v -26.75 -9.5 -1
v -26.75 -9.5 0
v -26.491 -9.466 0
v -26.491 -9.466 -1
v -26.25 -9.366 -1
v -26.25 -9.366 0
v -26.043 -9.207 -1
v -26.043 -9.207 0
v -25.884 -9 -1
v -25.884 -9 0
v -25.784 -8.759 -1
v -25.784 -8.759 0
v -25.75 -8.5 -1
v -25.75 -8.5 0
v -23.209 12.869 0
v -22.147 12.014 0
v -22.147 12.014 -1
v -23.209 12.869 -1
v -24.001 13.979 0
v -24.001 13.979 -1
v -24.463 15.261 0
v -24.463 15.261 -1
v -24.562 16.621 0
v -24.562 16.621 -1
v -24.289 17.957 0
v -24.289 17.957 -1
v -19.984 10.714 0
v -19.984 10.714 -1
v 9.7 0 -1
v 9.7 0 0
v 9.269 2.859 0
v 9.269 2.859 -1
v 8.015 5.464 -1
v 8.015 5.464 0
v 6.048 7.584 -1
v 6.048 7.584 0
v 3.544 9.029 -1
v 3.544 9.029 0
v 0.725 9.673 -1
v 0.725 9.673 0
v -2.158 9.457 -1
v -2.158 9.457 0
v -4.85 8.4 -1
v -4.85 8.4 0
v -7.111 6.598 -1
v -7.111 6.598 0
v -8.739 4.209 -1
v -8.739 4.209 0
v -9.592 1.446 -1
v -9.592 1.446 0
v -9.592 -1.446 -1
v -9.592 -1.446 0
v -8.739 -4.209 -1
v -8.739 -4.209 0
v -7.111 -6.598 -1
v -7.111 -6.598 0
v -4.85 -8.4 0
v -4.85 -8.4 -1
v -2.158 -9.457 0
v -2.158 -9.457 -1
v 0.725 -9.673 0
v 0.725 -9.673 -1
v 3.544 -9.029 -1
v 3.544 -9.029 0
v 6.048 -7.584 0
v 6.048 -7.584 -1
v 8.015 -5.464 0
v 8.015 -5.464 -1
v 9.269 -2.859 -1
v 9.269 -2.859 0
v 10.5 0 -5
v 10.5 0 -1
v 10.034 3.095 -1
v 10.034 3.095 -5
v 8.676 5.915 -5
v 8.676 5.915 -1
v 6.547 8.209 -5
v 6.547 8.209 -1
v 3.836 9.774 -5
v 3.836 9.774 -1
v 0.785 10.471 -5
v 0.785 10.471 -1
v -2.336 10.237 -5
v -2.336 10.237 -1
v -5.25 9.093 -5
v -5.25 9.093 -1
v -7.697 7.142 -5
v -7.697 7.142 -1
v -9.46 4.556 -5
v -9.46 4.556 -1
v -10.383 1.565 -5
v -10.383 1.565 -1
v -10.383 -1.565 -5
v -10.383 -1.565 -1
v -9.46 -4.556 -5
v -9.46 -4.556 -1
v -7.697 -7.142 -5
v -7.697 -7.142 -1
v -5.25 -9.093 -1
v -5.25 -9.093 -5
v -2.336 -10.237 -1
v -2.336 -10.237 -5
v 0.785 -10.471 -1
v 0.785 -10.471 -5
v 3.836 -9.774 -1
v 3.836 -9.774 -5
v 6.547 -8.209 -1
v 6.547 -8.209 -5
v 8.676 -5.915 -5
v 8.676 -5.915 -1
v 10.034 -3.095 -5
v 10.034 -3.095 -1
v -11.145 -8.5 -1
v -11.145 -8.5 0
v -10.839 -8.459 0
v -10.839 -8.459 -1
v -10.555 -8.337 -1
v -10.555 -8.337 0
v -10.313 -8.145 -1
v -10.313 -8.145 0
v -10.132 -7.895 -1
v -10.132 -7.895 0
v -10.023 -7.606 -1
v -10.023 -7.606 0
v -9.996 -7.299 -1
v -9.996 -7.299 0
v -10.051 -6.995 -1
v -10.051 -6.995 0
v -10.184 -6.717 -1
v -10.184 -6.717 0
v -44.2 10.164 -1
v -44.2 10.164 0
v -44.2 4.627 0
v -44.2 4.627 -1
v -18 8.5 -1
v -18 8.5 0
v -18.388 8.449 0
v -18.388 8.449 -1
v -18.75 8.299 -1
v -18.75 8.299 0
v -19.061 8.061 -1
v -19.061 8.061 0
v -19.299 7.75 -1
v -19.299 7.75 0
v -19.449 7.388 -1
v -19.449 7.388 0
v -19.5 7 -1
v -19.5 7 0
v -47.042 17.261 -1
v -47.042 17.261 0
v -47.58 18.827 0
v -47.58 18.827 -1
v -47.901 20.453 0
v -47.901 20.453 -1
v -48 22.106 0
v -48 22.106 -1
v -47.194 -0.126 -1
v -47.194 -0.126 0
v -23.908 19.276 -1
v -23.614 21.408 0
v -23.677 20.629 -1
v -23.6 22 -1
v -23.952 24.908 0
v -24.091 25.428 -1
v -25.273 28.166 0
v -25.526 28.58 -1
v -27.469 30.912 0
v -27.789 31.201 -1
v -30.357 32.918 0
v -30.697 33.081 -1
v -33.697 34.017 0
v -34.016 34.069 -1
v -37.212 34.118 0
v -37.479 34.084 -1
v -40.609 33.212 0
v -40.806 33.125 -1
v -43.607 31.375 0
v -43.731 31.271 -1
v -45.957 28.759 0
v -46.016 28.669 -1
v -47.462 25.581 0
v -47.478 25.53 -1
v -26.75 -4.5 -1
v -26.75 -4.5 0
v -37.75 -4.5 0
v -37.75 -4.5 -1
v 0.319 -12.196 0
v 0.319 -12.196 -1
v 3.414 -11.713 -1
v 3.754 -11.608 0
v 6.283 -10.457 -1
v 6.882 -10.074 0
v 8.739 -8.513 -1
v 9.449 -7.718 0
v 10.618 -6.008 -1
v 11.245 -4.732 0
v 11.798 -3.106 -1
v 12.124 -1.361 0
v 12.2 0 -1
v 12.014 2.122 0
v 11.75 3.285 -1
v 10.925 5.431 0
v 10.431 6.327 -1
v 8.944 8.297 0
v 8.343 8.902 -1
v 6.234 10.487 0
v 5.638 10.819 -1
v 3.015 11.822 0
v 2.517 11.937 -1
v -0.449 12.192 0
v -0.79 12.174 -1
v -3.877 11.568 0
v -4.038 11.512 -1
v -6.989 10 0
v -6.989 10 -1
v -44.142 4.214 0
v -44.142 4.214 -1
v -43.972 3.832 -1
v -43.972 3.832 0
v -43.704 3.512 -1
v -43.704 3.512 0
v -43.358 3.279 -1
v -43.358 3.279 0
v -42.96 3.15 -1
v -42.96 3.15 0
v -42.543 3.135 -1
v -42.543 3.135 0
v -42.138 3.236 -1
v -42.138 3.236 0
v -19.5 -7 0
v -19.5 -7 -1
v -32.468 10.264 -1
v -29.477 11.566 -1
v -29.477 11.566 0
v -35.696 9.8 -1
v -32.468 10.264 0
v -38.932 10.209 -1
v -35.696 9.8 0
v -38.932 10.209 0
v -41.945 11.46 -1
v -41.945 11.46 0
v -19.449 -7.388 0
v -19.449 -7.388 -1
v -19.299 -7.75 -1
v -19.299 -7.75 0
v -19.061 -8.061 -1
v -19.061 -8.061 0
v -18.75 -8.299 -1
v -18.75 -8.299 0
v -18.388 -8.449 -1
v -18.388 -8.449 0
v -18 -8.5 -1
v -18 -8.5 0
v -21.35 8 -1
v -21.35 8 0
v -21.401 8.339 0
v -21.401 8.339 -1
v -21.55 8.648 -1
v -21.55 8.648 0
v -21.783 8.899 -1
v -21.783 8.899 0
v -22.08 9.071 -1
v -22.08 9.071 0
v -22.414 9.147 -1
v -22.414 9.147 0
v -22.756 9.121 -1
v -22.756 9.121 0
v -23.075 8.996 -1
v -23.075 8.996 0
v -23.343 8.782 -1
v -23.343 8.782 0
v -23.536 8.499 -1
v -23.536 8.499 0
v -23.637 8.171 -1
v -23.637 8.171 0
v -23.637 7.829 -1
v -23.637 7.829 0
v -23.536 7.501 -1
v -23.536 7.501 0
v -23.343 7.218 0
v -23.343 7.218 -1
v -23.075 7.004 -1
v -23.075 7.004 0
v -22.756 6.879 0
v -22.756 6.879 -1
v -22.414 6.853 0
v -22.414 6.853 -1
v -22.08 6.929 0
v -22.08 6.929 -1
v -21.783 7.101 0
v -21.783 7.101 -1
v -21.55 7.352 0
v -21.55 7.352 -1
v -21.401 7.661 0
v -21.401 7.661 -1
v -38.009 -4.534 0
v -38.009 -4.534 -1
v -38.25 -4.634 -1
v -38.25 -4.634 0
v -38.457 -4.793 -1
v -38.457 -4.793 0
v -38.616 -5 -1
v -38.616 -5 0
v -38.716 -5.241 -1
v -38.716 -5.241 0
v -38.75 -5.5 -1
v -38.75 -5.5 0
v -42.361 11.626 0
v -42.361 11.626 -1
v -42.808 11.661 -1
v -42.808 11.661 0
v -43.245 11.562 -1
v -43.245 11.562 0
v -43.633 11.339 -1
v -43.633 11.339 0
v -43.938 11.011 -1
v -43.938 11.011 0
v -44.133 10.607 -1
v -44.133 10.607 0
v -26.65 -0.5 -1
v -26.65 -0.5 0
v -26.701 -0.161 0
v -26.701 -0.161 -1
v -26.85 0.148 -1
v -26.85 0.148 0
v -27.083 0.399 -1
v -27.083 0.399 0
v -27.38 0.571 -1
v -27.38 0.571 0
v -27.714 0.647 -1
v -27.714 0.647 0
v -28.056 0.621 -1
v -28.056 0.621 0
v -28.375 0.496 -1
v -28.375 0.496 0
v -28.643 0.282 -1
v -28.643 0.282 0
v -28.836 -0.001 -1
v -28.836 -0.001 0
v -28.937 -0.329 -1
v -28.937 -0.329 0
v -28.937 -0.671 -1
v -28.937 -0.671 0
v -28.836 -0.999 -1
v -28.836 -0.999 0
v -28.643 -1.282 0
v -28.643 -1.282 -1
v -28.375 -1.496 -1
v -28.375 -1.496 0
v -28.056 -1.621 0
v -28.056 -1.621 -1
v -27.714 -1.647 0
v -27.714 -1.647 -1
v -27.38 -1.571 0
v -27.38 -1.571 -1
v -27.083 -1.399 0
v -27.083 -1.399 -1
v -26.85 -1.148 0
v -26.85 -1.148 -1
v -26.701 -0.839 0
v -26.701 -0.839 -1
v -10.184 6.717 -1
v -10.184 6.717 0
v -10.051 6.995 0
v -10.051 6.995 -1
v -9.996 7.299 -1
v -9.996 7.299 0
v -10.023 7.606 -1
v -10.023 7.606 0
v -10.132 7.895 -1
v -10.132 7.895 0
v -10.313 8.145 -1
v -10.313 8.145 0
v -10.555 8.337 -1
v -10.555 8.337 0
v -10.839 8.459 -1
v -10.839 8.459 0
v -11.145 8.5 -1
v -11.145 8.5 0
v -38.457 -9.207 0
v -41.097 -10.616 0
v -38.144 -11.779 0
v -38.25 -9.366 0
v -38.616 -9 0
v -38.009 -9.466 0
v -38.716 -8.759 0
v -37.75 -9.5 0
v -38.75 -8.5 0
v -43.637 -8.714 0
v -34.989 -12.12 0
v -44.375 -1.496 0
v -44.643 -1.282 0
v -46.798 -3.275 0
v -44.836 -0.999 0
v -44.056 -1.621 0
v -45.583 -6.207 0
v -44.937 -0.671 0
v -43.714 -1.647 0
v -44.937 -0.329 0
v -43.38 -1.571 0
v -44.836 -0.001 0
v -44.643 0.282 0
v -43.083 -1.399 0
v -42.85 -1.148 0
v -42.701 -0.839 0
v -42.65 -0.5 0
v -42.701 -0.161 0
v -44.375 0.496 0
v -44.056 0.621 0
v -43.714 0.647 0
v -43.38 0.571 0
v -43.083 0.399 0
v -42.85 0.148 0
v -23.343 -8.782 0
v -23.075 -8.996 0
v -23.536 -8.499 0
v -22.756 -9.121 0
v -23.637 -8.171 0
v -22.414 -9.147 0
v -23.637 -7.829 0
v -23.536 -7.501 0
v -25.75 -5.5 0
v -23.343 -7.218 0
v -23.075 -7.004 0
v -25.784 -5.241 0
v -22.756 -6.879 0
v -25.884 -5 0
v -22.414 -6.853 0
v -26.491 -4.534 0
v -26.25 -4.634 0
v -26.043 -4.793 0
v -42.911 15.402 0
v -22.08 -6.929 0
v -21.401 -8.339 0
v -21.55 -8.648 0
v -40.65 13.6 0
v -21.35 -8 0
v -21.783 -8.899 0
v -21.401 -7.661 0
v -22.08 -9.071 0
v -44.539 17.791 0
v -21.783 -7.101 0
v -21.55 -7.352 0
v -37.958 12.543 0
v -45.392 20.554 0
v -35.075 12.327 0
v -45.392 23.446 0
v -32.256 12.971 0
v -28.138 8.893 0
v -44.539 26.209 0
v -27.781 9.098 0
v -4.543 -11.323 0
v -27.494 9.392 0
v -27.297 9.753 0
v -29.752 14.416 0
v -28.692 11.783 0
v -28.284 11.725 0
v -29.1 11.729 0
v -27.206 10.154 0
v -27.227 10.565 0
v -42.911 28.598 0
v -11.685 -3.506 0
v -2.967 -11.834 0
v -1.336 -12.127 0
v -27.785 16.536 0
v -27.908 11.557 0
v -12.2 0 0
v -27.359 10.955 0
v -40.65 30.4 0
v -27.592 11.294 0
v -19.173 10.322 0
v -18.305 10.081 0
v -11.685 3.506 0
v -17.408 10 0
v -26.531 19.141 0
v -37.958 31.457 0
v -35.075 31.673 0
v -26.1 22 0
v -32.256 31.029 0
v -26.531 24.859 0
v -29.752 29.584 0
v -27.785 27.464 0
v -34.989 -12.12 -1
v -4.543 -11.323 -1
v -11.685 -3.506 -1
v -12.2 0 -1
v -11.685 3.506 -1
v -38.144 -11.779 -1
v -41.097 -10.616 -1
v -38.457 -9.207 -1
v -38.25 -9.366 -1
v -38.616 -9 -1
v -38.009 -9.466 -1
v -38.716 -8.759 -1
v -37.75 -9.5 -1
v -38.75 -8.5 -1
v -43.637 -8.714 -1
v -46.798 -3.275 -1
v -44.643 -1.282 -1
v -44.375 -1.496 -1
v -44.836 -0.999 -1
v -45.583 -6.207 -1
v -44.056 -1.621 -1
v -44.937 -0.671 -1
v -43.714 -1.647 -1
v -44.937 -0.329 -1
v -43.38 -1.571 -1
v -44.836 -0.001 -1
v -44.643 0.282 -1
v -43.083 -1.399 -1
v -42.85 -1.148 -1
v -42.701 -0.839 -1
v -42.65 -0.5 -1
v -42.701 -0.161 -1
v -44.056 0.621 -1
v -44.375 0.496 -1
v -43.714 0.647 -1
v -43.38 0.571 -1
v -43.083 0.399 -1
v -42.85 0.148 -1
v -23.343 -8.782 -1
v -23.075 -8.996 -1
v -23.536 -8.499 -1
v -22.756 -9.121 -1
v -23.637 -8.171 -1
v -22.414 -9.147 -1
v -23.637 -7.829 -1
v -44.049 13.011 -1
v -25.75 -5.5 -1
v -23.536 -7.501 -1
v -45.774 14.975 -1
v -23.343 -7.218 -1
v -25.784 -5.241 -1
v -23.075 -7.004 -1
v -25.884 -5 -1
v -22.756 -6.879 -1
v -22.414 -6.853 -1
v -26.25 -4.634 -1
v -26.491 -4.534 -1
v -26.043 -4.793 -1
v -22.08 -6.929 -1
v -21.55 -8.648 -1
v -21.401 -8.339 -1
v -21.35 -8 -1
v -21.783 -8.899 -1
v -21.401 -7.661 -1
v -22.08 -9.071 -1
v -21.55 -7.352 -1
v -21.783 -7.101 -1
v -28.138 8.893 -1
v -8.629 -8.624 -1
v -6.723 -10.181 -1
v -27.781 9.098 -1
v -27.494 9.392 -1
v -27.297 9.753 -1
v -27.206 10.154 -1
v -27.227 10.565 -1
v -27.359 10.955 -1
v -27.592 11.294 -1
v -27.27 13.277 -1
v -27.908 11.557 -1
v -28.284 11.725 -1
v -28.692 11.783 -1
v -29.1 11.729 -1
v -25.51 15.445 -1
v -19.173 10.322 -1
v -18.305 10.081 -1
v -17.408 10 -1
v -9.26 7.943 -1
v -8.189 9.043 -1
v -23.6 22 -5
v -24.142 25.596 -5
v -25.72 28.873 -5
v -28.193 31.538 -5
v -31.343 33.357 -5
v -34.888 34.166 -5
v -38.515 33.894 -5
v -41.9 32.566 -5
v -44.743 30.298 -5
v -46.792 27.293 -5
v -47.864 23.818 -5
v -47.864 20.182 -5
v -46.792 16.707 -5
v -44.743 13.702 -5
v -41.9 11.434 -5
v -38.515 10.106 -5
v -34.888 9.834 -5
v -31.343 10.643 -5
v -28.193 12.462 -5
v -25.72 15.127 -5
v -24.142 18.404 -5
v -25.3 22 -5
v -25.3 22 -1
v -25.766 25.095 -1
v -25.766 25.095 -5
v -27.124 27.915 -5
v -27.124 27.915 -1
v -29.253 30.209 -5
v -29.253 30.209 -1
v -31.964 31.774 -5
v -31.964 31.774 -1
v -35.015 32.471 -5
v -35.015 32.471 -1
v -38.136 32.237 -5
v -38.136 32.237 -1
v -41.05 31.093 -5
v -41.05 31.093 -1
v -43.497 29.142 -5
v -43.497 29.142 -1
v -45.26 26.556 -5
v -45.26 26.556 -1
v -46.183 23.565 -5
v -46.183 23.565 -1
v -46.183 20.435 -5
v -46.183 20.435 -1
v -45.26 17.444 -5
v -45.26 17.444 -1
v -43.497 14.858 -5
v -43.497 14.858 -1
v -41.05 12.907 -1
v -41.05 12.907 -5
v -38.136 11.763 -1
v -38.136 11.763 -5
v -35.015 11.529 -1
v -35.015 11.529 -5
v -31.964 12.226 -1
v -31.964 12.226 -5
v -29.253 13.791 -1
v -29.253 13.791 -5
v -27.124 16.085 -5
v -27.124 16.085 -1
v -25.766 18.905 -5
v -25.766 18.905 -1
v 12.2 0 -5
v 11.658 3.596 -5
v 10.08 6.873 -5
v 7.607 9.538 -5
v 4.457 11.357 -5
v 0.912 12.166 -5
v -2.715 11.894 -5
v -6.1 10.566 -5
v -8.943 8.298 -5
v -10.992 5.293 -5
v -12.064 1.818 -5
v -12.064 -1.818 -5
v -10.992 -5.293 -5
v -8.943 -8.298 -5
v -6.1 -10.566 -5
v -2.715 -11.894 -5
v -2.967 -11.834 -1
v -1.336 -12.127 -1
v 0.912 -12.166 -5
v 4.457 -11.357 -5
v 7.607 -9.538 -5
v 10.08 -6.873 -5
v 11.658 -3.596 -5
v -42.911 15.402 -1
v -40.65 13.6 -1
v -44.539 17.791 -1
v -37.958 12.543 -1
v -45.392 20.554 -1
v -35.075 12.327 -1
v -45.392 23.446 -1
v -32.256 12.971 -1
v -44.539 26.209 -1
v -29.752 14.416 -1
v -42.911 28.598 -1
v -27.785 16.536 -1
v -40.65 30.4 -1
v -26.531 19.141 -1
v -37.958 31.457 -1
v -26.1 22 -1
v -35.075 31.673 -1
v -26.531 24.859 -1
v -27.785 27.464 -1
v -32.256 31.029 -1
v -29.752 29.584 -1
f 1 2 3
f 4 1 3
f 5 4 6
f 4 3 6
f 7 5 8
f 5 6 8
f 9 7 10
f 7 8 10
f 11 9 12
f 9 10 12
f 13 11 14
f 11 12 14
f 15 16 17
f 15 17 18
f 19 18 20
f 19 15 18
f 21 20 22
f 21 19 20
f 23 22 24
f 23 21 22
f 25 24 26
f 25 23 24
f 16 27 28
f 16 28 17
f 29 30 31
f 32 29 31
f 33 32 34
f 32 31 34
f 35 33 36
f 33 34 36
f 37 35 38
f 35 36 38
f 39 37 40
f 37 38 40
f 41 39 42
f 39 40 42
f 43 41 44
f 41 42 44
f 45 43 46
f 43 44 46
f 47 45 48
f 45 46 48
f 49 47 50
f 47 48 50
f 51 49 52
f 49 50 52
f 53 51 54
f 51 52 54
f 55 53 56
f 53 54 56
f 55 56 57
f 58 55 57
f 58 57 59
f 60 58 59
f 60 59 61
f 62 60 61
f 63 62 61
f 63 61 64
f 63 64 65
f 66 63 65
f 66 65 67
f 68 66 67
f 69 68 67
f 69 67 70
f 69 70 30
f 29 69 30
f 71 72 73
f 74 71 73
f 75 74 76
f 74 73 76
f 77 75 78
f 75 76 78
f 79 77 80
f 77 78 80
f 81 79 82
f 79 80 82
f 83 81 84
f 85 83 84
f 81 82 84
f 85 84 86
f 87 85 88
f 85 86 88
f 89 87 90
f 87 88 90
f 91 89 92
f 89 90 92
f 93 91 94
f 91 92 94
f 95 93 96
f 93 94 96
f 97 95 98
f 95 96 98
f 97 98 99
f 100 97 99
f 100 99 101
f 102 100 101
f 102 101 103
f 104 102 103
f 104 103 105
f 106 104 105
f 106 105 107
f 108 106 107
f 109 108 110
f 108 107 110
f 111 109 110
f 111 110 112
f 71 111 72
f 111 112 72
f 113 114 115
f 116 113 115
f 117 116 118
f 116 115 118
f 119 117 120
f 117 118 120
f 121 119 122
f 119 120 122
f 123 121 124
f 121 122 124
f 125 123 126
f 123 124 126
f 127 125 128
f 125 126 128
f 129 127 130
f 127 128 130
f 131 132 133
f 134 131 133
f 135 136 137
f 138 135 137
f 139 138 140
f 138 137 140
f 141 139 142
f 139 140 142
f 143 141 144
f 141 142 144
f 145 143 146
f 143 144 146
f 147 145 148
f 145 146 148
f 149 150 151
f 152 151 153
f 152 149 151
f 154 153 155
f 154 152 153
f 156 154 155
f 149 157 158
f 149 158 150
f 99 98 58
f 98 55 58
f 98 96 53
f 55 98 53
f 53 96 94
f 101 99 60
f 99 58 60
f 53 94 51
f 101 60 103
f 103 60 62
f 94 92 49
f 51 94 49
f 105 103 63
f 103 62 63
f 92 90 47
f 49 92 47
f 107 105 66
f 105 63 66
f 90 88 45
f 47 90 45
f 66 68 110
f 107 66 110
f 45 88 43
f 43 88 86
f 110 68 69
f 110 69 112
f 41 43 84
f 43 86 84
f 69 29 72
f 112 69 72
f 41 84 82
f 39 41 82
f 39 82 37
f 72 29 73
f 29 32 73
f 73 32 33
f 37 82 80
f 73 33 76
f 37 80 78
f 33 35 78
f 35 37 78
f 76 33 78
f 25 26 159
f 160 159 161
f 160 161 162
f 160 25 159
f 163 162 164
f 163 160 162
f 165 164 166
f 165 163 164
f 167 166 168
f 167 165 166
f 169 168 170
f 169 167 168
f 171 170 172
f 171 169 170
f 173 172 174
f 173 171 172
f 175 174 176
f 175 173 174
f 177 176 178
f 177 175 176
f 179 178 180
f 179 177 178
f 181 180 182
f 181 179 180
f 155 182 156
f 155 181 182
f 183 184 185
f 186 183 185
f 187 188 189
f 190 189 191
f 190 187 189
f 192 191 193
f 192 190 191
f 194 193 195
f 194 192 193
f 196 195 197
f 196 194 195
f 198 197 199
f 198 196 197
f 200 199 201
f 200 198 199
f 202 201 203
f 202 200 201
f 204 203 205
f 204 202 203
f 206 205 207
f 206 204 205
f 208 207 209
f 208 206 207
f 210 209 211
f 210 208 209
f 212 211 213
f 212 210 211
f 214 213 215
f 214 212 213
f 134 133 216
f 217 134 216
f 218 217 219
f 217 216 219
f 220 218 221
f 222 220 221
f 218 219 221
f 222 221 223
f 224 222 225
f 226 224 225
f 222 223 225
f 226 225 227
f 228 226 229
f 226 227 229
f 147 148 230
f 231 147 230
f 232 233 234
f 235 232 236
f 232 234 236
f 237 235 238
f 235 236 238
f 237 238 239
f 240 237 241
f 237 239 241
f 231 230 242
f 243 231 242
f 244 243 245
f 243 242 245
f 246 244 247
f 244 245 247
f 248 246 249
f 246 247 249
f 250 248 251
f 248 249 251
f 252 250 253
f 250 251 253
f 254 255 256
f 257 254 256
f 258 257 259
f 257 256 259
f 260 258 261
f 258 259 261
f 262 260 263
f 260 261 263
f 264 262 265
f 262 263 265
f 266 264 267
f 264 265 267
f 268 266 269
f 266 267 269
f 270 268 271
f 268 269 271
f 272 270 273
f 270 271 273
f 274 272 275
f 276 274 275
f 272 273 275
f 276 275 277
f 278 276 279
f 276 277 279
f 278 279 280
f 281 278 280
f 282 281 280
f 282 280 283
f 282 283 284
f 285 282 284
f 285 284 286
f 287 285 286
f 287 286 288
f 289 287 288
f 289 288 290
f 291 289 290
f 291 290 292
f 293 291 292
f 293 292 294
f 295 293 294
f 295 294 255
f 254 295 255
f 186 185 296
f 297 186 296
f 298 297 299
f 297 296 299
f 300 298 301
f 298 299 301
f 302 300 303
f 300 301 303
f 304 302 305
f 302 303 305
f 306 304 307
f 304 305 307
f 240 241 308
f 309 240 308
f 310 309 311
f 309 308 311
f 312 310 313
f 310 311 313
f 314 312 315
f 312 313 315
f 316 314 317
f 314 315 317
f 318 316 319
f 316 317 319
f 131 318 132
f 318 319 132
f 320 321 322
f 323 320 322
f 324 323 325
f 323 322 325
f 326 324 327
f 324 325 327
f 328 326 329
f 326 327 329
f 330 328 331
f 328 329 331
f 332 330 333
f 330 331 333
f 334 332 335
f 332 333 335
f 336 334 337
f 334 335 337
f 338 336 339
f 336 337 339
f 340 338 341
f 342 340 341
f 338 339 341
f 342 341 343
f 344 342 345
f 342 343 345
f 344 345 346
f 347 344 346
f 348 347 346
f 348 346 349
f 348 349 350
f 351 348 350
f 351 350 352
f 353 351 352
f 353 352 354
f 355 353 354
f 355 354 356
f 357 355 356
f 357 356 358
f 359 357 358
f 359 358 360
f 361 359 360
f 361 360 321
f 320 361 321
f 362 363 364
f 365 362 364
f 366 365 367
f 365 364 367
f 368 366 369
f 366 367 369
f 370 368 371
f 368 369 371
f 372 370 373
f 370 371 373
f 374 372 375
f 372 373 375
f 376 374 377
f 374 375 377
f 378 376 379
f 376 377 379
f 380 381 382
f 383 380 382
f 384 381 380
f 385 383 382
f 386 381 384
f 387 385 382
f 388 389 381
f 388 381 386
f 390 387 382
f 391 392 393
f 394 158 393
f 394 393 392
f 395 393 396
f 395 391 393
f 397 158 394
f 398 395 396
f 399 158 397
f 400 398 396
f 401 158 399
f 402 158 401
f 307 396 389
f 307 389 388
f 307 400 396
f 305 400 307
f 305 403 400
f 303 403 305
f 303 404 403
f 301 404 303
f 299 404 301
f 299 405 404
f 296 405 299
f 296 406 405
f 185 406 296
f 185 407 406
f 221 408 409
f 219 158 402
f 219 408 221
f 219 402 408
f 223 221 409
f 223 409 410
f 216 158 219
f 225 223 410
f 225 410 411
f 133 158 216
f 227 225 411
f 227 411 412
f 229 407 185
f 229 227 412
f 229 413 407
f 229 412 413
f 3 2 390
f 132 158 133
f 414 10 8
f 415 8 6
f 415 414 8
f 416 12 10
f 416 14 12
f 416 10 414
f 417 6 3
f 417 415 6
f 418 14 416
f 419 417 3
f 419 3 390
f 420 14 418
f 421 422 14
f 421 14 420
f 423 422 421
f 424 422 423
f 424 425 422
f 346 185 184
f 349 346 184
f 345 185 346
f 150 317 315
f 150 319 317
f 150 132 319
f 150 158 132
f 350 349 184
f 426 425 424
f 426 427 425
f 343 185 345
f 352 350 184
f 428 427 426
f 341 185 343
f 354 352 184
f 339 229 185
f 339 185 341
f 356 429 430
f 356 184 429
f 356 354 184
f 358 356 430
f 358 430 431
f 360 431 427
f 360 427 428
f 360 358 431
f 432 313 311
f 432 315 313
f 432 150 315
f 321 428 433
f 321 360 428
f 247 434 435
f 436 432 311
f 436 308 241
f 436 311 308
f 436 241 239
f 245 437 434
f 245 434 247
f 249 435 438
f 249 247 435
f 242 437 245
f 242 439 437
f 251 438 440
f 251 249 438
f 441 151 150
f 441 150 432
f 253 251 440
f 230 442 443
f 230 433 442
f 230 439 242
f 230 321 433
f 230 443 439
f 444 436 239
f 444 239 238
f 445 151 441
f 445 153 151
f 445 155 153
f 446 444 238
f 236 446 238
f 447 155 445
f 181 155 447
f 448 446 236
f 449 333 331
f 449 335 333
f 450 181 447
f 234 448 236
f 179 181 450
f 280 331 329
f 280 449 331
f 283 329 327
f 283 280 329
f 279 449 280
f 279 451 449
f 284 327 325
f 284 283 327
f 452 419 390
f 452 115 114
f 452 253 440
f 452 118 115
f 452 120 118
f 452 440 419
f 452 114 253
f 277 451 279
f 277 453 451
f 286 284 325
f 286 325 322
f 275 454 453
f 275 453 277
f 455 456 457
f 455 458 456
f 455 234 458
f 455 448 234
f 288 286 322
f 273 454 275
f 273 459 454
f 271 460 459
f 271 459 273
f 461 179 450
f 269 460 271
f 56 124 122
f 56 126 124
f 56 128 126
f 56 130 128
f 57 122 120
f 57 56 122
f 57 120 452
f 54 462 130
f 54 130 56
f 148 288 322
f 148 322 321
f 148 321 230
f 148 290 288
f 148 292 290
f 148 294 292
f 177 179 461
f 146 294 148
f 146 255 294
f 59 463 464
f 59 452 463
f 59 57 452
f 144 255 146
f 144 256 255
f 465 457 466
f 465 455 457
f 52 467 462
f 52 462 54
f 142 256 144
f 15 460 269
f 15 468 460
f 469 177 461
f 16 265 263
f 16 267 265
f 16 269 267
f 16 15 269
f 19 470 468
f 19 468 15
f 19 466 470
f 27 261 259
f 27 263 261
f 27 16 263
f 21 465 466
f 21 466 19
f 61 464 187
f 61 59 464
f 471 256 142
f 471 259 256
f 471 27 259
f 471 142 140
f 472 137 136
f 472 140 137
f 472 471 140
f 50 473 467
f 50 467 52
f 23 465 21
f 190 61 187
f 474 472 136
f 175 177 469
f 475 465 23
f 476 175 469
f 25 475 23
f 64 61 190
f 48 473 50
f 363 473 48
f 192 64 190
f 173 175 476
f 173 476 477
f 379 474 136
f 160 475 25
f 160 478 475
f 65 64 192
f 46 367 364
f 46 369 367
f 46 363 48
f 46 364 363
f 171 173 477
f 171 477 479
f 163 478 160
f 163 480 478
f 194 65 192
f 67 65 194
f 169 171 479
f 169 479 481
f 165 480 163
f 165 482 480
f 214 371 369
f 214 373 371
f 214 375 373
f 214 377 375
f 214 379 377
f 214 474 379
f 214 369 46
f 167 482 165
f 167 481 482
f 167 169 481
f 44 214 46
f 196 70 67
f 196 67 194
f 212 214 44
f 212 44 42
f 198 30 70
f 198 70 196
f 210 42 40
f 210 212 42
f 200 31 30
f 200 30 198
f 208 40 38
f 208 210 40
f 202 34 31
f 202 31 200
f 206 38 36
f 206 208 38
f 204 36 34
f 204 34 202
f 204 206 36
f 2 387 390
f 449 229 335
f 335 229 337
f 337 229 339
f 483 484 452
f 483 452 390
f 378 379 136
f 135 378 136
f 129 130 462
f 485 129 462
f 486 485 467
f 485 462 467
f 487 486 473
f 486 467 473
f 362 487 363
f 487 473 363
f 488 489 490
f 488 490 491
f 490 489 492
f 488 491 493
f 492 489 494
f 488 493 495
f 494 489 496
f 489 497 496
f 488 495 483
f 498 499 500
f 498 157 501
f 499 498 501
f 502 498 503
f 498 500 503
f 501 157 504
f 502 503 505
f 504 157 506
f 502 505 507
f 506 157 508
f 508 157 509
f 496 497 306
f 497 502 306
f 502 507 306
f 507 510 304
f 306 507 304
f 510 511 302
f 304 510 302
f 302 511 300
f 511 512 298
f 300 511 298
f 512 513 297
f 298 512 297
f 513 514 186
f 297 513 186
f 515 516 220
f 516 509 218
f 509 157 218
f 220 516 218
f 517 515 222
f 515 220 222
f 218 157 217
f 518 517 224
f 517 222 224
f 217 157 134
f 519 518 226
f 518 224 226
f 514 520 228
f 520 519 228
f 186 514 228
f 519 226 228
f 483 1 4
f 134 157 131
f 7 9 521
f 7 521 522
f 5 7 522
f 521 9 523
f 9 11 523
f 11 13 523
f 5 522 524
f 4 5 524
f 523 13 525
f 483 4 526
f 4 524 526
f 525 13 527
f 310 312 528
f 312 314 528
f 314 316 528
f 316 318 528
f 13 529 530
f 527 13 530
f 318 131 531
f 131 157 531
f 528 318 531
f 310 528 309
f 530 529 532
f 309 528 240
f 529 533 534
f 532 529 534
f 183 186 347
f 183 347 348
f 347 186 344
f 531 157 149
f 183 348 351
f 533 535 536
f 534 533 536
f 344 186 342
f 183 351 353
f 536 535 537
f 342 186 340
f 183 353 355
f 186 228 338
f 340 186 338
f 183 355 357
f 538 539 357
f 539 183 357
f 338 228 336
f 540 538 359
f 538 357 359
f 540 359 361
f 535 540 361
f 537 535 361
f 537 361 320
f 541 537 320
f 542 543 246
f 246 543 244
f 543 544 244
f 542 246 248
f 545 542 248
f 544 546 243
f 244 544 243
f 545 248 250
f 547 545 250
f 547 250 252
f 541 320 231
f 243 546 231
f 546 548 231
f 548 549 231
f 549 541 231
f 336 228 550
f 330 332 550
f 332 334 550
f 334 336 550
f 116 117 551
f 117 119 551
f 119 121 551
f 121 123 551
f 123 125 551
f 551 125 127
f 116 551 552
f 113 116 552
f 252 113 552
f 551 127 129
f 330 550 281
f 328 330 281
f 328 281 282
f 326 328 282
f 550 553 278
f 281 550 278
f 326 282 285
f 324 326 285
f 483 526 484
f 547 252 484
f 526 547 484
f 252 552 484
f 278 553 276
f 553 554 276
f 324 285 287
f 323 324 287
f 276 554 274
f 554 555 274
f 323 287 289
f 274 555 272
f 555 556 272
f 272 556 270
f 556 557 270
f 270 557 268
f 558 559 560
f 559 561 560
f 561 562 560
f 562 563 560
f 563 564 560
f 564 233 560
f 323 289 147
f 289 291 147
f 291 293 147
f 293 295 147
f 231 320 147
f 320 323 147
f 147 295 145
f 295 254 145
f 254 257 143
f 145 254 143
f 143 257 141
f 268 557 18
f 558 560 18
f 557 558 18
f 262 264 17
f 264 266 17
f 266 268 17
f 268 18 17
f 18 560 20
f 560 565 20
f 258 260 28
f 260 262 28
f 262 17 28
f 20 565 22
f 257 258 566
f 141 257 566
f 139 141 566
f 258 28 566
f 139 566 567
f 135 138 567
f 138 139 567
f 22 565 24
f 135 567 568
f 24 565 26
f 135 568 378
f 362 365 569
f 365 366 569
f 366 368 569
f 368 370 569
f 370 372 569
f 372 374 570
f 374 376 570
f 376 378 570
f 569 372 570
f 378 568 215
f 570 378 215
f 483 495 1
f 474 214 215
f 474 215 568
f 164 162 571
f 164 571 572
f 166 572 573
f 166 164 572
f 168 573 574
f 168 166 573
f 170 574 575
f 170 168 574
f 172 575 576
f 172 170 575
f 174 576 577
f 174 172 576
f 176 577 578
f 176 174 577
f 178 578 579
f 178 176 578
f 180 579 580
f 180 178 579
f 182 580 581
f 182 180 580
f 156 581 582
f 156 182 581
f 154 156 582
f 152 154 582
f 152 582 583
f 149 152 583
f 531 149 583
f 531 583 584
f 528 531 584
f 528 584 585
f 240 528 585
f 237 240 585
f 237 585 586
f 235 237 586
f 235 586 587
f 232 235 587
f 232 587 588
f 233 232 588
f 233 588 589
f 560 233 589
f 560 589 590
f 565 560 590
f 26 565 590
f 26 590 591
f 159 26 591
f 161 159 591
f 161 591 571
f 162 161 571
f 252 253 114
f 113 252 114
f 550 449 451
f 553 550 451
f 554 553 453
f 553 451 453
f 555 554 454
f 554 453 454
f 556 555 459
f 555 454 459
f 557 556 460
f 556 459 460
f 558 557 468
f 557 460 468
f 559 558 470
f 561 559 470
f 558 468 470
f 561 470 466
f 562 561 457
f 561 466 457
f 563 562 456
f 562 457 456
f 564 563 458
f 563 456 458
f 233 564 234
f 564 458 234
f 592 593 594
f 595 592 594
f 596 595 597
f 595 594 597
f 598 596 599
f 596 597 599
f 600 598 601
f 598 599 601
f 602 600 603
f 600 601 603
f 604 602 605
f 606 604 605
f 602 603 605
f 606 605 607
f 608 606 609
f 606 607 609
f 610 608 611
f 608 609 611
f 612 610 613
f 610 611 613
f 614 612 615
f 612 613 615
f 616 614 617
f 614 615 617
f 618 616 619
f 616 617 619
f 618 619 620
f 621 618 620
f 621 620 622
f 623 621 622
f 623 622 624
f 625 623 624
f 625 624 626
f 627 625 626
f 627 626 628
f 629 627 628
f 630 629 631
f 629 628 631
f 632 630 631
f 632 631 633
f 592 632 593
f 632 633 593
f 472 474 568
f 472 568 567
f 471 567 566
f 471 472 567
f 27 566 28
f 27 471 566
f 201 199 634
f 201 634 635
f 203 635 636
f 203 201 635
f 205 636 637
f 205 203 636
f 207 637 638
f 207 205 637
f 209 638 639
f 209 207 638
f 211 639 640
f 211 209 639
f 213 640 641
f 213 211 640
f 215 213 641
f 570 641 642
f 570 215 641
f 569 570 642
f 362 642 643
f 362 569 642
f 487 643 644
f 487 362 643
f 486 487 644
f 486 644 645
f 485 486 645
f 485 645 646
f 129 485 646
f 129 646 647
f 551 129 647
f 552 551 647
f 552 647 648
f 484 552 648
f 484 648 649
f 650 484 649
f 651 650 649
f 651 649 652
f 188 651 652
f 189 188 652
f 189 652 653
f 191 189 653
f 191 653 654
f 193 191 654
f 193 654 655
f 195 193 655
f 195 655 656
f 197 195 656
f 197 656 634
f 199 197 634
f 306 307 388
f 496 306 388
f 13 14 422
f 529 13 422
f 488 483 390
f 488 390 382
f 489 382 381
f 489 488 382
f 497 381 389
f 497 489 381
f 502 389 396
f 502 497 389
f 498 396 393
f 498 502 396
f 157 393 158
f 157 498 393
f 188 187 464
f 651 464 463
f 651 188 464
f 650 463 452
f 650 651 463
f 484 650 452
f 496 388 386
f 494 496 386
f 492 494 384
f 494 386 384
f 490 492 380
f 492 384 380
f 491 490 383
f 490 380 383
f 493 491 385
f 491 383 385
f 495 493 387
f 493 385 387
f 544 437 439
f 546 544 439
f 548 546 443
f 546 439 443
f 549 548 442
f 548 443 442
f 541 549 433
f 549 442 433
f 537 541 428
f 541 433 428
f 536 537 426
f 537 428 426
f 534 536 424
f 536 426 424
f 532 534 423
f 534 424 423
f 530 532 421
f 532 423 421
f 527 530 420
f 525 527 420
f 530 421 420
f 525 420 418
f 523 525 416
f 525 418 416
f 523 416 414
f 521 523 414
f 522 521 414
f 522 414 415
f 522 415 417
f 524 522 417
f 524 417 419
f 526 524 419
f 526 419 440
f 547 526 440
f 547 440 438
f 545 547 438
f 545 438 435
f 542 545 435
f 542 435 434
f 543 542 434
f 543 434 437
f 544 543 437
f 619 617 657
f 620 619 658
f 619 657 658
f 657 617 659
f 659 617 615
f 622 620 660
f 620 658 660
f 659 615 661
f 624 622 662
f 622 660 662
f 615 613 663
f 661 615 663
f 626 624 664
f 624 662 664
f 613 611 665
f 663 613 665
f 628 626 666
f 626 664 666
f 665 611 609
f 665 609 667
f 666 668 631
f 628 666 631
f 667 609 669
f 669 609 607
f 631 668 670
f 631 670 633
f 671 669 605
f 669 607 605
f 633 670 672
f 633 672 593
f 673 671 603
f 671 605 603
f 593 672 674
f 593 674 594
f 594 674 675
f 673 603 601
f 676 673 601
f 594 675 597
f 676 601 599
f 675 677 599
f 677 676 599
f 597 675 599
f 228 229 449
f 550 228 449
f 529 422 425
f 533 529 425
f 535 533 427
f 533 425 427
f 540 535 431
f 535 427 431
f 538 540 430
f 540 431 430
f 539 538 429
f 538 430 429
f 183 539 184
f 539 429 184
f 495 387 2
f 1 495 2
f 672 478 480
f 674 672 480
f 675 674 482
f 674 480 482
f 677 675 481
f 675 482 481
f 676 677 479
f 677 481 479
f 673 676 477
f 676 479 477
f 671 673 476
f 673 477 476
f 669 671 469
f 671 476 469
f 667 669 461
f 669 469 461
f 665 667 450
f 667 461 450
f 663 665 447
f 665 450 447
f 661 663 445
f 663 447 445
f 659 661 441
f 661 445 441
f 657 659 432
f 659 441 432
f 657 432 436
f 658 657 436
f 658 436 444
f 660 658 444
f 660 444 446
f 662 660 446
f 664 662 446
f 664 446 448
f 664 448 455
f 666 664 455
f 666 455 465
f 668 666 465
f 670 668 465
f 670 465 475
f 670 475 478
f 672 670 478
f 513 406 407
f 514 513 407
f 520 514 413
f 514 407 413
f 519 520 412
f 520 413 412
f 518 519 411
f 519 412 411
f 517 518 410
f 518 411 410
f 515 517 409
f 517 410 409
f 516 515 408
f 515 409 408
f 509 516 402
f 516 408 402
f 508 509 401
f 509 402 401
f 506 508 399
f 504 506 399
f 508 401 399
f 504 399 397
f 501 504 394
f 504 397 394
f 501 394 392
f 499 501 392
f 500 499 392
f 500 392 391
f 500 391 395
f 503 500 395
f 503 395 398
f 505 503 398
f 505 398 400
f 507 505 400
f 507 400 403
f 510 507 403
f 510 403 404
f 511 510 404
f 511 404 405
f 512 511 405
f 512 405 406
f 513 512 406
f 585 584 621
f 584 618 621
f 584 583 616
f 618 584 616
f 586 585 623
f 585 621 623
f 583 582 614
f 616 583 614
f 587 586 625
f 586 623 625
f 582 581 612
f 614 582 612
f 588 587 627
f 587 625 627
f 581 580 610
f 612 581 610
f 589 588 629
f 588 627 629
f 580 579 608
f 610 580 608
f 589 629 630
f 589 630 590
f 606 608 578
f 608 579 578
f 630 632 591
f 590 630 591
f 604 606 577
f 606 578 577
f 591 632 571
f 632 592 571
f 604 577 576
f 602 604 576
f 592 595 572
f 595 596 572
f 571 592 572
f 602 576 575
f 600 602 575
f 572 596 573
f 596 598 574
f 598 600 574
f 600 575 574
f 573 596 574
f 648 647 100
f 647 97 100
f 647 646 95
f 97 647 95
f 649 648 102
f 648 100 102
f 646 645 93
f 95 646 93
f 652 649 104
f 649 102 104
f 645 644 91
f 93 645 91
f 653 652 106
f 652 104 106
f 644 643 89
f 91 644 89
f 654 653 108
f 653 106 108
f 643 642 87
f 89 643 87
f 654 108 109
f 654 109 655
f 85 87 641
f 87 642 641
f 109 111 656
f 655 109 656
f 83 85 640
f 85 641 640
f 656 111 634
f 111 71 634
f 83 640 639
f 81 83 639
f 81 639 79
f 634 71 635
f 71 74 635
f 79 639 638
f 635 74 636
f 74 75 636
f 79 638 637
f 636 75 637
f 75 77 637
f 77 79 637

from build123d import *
from build123d.topology import SkipClean

# Parameters (mm, degrees)
EXTRUDE_1_DEPTH     = 1
SKETCH_3_R          = 9.7
SKETCH_3_R_2        = 1.15
CUT_EXTRUDE_1_DEPTH = 60.104137335
SKETCH_4_R          = 12.2
SKETCH_4_R_2        = 10.5
EXTRUDE_2_DEPTH     = 4
CUT_EXTRUDE_2_DEPTH = 60.230896077


with BuildPart() as part:
    # 草图2 → 凸台-拉伸1 (new body)
    with BuildSketch(Plane.XY):
        with BuildLine():
            Line((-47.999535461, 22.106463733), (-48.193482209, -0.117632256))
            ThreePointArc((-48.193482209, -0.117632256), (-44.33750525, -9.426784127), (-34.962475131, -13.1197067))
            Line((-34.962475131, -13.1197067), (0.319358769, -12.195819365))
            ThreePointArc((0.319358769, -12.195819365), (11.588061422, 3.815341724), (-6.988562084, 10))
            Line((-6.988562084, 10), (-17.408374558, 10))
            ThreePointArc((-17.408374558, 10), (-18.744566439, 10.181847734), (-19.983564933, 10.714163496))
            Line((-19.983564933, 10.714163496), (-22.14712826, 12.014163496))
            ThreePointArc((-22.14712826, 12.014163496), (-24.275653905, 14.604401107), (-24.289397802, 17.956976744))
            ThreePointArc((-24.289397802, 17.956976744), (-33.696855253, 34.017353376), (-47.999535461, 22.106463733))
        make_face()
    extrude(amount=-EXTRUDE_1_DEPTH)

    # 草图3 → 切除-拉伸1 (cut, through all)
    with BuildSketch(Plane.XY):
        with BuildLine():
            ThreePointArc((-18, 8.5), (-19.060660172, 8.060660172), (-19.5, 7))
            Line((-19.5, 7), (-19.5, -7))
            ThreePointArc((-19.5, -7), (-19.060660172, -8.060660172), (-18, -8.5))
            Line((-18, -8.5), (-11.144505373, -8.5))
            ThreePointArc((-11.144505373, -8.5), (-10.131929949, -7.895152283), (-10.184491801, -6.716853933))
            ThreePointArc((-10.184491801, -6.716853933), (-12.2, 0), (-10.184491801, 6.716853933))
            ThreePointArc((-10.184491801, 6.716853933), (-10.131929949, 7.895152283), (-11.144505373, 8.5))
            Line((-11.144505373, 8.5), (-18, 8.5))
        make_face()
        with BuildLine():
            ThreePointArc((-41.944525547, 11.460322311), (-43.44725776, 11.465077783), (-44.2, 10.1644603))
            Line((-44.2, 10.1644603), (-44.2, 4.626978026))
            ThreePointArc((-44.2, 4.626978026), (-43.538789355, 3.383421667), (-42.13809011, 3.236202244))
            Line((-42.13809011, 3.236202244), (-28.13809011, 8.892569405))
            ThreePointArc((-28.13809011, 8.892569405), (-27.358855493, 10.955157224), (-29.477372263, 11.566190605))
            ThreePointArc((-29.477372263, 11.566190605), (-35.696404047, 9.800439849), (-41.944525547, 11.460322311))
        make_face()
        with BuildLine():
            Line((-26.75, -4.5), (-37.75, -4.5))
            ThreePointArc((-37.75, -4.5), (-38.457106781, -4.792893219), (-38.75, -5.5))
            Line((-38.75, -5.5), (-38.75, -8.5))
            ThreePointArc((-38.75, -8.5), (-38.457106781, -9.207106781), (-37.75, -9.5))
            Line((-37.75, -9.5), (-26.75, -9.5))
            ThreePointArc((-26.75, -9.5), (-26.042893219, -9.207106781), (-25.75, -8.5))
            Line((-25.75, -8.5), (-25.75, -5.5))
            ThreePointArc((-25.75, -5.5), (-26.042893219, -4.792893219), (-26.75, -4.5))
        make_face()
        Circle(SKETCH_3_R)
        with Locations((-35.8, 22)):
            Circle(SKETCH_3_R)
        with Locations((-43.8, -0.5)):
            Circle(SKETCH_3_R_2)
        with Locations((-27.8, -0.5)):
            Circle(SKETCH_3_R_2)
        with Locations((-22.5, 8)):
            Circle(SKETCH_3_R_2)
        with Locations((-22.5, -8)):
            Circle(SKETCH_3_R_2)
    extrude(amount=-CUT_EXTRUDE_1_DEPTH, mode=Mode.SUBTRACT)

    # 草图4 → 凸台-拉伸2 (add)
    # profile 1 of 2: a face of its own
    with BuildSketch(Plane.XY.offset(-1)):
        with Locations((-35.8, 22)):
            Circle(SKETCH_4_R)
        with Locations((-35.8, 22)):
            Circle(SKETCH_4_R_2, mode=Mode.SUBTRACT)
    # profile 2 of 2: a face of its own
    with BuildSketch(Plane.XY.offset(-1)):
        Circle(SKETCH_4_R)
        Circle(SKETCH_4_R_2, mode=Mode.SUBTRACT)
    extrude(amount=-EXTRUDE_2_DEPTH)

    # 草图6 → 切除-拉伸2 (cut, through all)
    with SkipClean():  # the faces are left unmerged after this step: merging them gives an invalid solid
        with BuildSketch(Plane(origin=(0, 0, -1), x_dir=(-1, 0, 0), z_dir=(0, 0, -1))):
            with BuildLine():
                Line((47.999535461, 22.106463733), (48.193482209, -0.117632256))
                ThreePointArc((48.193482209, -0.117632256), (44.33750525, -9.426784127), (34.962475131, -13.1197067))
                Line((34.962475131, -13.1197067), (-0.319358769, -12.195819365))
                ThreePointArc((-0.319358769, -12.195819365), (2.156225392, -12.007942874), (4.542515187, -11.322789222))
                Line((4.542515187, -11.322789222), (34.988652079, -12.120049375))
                ThreePointArc((34.988652079, -12.120049375), (43.636595985, -8.713533678), (47.193520286, -0.126358792))
                Line((47.193520286, -0.126358792), (47.041786885, 17.26056674))
                ThreePointArc((47.041786885, 17.26056674), (47.768482684, 19.634535512), (47.999535461, 22.106463733))
            make_face()
        extrude(amount=-CUT_EXTRUDE_2_DEPTH, mode=Mode.SUBTRACT)


solid = part.part
